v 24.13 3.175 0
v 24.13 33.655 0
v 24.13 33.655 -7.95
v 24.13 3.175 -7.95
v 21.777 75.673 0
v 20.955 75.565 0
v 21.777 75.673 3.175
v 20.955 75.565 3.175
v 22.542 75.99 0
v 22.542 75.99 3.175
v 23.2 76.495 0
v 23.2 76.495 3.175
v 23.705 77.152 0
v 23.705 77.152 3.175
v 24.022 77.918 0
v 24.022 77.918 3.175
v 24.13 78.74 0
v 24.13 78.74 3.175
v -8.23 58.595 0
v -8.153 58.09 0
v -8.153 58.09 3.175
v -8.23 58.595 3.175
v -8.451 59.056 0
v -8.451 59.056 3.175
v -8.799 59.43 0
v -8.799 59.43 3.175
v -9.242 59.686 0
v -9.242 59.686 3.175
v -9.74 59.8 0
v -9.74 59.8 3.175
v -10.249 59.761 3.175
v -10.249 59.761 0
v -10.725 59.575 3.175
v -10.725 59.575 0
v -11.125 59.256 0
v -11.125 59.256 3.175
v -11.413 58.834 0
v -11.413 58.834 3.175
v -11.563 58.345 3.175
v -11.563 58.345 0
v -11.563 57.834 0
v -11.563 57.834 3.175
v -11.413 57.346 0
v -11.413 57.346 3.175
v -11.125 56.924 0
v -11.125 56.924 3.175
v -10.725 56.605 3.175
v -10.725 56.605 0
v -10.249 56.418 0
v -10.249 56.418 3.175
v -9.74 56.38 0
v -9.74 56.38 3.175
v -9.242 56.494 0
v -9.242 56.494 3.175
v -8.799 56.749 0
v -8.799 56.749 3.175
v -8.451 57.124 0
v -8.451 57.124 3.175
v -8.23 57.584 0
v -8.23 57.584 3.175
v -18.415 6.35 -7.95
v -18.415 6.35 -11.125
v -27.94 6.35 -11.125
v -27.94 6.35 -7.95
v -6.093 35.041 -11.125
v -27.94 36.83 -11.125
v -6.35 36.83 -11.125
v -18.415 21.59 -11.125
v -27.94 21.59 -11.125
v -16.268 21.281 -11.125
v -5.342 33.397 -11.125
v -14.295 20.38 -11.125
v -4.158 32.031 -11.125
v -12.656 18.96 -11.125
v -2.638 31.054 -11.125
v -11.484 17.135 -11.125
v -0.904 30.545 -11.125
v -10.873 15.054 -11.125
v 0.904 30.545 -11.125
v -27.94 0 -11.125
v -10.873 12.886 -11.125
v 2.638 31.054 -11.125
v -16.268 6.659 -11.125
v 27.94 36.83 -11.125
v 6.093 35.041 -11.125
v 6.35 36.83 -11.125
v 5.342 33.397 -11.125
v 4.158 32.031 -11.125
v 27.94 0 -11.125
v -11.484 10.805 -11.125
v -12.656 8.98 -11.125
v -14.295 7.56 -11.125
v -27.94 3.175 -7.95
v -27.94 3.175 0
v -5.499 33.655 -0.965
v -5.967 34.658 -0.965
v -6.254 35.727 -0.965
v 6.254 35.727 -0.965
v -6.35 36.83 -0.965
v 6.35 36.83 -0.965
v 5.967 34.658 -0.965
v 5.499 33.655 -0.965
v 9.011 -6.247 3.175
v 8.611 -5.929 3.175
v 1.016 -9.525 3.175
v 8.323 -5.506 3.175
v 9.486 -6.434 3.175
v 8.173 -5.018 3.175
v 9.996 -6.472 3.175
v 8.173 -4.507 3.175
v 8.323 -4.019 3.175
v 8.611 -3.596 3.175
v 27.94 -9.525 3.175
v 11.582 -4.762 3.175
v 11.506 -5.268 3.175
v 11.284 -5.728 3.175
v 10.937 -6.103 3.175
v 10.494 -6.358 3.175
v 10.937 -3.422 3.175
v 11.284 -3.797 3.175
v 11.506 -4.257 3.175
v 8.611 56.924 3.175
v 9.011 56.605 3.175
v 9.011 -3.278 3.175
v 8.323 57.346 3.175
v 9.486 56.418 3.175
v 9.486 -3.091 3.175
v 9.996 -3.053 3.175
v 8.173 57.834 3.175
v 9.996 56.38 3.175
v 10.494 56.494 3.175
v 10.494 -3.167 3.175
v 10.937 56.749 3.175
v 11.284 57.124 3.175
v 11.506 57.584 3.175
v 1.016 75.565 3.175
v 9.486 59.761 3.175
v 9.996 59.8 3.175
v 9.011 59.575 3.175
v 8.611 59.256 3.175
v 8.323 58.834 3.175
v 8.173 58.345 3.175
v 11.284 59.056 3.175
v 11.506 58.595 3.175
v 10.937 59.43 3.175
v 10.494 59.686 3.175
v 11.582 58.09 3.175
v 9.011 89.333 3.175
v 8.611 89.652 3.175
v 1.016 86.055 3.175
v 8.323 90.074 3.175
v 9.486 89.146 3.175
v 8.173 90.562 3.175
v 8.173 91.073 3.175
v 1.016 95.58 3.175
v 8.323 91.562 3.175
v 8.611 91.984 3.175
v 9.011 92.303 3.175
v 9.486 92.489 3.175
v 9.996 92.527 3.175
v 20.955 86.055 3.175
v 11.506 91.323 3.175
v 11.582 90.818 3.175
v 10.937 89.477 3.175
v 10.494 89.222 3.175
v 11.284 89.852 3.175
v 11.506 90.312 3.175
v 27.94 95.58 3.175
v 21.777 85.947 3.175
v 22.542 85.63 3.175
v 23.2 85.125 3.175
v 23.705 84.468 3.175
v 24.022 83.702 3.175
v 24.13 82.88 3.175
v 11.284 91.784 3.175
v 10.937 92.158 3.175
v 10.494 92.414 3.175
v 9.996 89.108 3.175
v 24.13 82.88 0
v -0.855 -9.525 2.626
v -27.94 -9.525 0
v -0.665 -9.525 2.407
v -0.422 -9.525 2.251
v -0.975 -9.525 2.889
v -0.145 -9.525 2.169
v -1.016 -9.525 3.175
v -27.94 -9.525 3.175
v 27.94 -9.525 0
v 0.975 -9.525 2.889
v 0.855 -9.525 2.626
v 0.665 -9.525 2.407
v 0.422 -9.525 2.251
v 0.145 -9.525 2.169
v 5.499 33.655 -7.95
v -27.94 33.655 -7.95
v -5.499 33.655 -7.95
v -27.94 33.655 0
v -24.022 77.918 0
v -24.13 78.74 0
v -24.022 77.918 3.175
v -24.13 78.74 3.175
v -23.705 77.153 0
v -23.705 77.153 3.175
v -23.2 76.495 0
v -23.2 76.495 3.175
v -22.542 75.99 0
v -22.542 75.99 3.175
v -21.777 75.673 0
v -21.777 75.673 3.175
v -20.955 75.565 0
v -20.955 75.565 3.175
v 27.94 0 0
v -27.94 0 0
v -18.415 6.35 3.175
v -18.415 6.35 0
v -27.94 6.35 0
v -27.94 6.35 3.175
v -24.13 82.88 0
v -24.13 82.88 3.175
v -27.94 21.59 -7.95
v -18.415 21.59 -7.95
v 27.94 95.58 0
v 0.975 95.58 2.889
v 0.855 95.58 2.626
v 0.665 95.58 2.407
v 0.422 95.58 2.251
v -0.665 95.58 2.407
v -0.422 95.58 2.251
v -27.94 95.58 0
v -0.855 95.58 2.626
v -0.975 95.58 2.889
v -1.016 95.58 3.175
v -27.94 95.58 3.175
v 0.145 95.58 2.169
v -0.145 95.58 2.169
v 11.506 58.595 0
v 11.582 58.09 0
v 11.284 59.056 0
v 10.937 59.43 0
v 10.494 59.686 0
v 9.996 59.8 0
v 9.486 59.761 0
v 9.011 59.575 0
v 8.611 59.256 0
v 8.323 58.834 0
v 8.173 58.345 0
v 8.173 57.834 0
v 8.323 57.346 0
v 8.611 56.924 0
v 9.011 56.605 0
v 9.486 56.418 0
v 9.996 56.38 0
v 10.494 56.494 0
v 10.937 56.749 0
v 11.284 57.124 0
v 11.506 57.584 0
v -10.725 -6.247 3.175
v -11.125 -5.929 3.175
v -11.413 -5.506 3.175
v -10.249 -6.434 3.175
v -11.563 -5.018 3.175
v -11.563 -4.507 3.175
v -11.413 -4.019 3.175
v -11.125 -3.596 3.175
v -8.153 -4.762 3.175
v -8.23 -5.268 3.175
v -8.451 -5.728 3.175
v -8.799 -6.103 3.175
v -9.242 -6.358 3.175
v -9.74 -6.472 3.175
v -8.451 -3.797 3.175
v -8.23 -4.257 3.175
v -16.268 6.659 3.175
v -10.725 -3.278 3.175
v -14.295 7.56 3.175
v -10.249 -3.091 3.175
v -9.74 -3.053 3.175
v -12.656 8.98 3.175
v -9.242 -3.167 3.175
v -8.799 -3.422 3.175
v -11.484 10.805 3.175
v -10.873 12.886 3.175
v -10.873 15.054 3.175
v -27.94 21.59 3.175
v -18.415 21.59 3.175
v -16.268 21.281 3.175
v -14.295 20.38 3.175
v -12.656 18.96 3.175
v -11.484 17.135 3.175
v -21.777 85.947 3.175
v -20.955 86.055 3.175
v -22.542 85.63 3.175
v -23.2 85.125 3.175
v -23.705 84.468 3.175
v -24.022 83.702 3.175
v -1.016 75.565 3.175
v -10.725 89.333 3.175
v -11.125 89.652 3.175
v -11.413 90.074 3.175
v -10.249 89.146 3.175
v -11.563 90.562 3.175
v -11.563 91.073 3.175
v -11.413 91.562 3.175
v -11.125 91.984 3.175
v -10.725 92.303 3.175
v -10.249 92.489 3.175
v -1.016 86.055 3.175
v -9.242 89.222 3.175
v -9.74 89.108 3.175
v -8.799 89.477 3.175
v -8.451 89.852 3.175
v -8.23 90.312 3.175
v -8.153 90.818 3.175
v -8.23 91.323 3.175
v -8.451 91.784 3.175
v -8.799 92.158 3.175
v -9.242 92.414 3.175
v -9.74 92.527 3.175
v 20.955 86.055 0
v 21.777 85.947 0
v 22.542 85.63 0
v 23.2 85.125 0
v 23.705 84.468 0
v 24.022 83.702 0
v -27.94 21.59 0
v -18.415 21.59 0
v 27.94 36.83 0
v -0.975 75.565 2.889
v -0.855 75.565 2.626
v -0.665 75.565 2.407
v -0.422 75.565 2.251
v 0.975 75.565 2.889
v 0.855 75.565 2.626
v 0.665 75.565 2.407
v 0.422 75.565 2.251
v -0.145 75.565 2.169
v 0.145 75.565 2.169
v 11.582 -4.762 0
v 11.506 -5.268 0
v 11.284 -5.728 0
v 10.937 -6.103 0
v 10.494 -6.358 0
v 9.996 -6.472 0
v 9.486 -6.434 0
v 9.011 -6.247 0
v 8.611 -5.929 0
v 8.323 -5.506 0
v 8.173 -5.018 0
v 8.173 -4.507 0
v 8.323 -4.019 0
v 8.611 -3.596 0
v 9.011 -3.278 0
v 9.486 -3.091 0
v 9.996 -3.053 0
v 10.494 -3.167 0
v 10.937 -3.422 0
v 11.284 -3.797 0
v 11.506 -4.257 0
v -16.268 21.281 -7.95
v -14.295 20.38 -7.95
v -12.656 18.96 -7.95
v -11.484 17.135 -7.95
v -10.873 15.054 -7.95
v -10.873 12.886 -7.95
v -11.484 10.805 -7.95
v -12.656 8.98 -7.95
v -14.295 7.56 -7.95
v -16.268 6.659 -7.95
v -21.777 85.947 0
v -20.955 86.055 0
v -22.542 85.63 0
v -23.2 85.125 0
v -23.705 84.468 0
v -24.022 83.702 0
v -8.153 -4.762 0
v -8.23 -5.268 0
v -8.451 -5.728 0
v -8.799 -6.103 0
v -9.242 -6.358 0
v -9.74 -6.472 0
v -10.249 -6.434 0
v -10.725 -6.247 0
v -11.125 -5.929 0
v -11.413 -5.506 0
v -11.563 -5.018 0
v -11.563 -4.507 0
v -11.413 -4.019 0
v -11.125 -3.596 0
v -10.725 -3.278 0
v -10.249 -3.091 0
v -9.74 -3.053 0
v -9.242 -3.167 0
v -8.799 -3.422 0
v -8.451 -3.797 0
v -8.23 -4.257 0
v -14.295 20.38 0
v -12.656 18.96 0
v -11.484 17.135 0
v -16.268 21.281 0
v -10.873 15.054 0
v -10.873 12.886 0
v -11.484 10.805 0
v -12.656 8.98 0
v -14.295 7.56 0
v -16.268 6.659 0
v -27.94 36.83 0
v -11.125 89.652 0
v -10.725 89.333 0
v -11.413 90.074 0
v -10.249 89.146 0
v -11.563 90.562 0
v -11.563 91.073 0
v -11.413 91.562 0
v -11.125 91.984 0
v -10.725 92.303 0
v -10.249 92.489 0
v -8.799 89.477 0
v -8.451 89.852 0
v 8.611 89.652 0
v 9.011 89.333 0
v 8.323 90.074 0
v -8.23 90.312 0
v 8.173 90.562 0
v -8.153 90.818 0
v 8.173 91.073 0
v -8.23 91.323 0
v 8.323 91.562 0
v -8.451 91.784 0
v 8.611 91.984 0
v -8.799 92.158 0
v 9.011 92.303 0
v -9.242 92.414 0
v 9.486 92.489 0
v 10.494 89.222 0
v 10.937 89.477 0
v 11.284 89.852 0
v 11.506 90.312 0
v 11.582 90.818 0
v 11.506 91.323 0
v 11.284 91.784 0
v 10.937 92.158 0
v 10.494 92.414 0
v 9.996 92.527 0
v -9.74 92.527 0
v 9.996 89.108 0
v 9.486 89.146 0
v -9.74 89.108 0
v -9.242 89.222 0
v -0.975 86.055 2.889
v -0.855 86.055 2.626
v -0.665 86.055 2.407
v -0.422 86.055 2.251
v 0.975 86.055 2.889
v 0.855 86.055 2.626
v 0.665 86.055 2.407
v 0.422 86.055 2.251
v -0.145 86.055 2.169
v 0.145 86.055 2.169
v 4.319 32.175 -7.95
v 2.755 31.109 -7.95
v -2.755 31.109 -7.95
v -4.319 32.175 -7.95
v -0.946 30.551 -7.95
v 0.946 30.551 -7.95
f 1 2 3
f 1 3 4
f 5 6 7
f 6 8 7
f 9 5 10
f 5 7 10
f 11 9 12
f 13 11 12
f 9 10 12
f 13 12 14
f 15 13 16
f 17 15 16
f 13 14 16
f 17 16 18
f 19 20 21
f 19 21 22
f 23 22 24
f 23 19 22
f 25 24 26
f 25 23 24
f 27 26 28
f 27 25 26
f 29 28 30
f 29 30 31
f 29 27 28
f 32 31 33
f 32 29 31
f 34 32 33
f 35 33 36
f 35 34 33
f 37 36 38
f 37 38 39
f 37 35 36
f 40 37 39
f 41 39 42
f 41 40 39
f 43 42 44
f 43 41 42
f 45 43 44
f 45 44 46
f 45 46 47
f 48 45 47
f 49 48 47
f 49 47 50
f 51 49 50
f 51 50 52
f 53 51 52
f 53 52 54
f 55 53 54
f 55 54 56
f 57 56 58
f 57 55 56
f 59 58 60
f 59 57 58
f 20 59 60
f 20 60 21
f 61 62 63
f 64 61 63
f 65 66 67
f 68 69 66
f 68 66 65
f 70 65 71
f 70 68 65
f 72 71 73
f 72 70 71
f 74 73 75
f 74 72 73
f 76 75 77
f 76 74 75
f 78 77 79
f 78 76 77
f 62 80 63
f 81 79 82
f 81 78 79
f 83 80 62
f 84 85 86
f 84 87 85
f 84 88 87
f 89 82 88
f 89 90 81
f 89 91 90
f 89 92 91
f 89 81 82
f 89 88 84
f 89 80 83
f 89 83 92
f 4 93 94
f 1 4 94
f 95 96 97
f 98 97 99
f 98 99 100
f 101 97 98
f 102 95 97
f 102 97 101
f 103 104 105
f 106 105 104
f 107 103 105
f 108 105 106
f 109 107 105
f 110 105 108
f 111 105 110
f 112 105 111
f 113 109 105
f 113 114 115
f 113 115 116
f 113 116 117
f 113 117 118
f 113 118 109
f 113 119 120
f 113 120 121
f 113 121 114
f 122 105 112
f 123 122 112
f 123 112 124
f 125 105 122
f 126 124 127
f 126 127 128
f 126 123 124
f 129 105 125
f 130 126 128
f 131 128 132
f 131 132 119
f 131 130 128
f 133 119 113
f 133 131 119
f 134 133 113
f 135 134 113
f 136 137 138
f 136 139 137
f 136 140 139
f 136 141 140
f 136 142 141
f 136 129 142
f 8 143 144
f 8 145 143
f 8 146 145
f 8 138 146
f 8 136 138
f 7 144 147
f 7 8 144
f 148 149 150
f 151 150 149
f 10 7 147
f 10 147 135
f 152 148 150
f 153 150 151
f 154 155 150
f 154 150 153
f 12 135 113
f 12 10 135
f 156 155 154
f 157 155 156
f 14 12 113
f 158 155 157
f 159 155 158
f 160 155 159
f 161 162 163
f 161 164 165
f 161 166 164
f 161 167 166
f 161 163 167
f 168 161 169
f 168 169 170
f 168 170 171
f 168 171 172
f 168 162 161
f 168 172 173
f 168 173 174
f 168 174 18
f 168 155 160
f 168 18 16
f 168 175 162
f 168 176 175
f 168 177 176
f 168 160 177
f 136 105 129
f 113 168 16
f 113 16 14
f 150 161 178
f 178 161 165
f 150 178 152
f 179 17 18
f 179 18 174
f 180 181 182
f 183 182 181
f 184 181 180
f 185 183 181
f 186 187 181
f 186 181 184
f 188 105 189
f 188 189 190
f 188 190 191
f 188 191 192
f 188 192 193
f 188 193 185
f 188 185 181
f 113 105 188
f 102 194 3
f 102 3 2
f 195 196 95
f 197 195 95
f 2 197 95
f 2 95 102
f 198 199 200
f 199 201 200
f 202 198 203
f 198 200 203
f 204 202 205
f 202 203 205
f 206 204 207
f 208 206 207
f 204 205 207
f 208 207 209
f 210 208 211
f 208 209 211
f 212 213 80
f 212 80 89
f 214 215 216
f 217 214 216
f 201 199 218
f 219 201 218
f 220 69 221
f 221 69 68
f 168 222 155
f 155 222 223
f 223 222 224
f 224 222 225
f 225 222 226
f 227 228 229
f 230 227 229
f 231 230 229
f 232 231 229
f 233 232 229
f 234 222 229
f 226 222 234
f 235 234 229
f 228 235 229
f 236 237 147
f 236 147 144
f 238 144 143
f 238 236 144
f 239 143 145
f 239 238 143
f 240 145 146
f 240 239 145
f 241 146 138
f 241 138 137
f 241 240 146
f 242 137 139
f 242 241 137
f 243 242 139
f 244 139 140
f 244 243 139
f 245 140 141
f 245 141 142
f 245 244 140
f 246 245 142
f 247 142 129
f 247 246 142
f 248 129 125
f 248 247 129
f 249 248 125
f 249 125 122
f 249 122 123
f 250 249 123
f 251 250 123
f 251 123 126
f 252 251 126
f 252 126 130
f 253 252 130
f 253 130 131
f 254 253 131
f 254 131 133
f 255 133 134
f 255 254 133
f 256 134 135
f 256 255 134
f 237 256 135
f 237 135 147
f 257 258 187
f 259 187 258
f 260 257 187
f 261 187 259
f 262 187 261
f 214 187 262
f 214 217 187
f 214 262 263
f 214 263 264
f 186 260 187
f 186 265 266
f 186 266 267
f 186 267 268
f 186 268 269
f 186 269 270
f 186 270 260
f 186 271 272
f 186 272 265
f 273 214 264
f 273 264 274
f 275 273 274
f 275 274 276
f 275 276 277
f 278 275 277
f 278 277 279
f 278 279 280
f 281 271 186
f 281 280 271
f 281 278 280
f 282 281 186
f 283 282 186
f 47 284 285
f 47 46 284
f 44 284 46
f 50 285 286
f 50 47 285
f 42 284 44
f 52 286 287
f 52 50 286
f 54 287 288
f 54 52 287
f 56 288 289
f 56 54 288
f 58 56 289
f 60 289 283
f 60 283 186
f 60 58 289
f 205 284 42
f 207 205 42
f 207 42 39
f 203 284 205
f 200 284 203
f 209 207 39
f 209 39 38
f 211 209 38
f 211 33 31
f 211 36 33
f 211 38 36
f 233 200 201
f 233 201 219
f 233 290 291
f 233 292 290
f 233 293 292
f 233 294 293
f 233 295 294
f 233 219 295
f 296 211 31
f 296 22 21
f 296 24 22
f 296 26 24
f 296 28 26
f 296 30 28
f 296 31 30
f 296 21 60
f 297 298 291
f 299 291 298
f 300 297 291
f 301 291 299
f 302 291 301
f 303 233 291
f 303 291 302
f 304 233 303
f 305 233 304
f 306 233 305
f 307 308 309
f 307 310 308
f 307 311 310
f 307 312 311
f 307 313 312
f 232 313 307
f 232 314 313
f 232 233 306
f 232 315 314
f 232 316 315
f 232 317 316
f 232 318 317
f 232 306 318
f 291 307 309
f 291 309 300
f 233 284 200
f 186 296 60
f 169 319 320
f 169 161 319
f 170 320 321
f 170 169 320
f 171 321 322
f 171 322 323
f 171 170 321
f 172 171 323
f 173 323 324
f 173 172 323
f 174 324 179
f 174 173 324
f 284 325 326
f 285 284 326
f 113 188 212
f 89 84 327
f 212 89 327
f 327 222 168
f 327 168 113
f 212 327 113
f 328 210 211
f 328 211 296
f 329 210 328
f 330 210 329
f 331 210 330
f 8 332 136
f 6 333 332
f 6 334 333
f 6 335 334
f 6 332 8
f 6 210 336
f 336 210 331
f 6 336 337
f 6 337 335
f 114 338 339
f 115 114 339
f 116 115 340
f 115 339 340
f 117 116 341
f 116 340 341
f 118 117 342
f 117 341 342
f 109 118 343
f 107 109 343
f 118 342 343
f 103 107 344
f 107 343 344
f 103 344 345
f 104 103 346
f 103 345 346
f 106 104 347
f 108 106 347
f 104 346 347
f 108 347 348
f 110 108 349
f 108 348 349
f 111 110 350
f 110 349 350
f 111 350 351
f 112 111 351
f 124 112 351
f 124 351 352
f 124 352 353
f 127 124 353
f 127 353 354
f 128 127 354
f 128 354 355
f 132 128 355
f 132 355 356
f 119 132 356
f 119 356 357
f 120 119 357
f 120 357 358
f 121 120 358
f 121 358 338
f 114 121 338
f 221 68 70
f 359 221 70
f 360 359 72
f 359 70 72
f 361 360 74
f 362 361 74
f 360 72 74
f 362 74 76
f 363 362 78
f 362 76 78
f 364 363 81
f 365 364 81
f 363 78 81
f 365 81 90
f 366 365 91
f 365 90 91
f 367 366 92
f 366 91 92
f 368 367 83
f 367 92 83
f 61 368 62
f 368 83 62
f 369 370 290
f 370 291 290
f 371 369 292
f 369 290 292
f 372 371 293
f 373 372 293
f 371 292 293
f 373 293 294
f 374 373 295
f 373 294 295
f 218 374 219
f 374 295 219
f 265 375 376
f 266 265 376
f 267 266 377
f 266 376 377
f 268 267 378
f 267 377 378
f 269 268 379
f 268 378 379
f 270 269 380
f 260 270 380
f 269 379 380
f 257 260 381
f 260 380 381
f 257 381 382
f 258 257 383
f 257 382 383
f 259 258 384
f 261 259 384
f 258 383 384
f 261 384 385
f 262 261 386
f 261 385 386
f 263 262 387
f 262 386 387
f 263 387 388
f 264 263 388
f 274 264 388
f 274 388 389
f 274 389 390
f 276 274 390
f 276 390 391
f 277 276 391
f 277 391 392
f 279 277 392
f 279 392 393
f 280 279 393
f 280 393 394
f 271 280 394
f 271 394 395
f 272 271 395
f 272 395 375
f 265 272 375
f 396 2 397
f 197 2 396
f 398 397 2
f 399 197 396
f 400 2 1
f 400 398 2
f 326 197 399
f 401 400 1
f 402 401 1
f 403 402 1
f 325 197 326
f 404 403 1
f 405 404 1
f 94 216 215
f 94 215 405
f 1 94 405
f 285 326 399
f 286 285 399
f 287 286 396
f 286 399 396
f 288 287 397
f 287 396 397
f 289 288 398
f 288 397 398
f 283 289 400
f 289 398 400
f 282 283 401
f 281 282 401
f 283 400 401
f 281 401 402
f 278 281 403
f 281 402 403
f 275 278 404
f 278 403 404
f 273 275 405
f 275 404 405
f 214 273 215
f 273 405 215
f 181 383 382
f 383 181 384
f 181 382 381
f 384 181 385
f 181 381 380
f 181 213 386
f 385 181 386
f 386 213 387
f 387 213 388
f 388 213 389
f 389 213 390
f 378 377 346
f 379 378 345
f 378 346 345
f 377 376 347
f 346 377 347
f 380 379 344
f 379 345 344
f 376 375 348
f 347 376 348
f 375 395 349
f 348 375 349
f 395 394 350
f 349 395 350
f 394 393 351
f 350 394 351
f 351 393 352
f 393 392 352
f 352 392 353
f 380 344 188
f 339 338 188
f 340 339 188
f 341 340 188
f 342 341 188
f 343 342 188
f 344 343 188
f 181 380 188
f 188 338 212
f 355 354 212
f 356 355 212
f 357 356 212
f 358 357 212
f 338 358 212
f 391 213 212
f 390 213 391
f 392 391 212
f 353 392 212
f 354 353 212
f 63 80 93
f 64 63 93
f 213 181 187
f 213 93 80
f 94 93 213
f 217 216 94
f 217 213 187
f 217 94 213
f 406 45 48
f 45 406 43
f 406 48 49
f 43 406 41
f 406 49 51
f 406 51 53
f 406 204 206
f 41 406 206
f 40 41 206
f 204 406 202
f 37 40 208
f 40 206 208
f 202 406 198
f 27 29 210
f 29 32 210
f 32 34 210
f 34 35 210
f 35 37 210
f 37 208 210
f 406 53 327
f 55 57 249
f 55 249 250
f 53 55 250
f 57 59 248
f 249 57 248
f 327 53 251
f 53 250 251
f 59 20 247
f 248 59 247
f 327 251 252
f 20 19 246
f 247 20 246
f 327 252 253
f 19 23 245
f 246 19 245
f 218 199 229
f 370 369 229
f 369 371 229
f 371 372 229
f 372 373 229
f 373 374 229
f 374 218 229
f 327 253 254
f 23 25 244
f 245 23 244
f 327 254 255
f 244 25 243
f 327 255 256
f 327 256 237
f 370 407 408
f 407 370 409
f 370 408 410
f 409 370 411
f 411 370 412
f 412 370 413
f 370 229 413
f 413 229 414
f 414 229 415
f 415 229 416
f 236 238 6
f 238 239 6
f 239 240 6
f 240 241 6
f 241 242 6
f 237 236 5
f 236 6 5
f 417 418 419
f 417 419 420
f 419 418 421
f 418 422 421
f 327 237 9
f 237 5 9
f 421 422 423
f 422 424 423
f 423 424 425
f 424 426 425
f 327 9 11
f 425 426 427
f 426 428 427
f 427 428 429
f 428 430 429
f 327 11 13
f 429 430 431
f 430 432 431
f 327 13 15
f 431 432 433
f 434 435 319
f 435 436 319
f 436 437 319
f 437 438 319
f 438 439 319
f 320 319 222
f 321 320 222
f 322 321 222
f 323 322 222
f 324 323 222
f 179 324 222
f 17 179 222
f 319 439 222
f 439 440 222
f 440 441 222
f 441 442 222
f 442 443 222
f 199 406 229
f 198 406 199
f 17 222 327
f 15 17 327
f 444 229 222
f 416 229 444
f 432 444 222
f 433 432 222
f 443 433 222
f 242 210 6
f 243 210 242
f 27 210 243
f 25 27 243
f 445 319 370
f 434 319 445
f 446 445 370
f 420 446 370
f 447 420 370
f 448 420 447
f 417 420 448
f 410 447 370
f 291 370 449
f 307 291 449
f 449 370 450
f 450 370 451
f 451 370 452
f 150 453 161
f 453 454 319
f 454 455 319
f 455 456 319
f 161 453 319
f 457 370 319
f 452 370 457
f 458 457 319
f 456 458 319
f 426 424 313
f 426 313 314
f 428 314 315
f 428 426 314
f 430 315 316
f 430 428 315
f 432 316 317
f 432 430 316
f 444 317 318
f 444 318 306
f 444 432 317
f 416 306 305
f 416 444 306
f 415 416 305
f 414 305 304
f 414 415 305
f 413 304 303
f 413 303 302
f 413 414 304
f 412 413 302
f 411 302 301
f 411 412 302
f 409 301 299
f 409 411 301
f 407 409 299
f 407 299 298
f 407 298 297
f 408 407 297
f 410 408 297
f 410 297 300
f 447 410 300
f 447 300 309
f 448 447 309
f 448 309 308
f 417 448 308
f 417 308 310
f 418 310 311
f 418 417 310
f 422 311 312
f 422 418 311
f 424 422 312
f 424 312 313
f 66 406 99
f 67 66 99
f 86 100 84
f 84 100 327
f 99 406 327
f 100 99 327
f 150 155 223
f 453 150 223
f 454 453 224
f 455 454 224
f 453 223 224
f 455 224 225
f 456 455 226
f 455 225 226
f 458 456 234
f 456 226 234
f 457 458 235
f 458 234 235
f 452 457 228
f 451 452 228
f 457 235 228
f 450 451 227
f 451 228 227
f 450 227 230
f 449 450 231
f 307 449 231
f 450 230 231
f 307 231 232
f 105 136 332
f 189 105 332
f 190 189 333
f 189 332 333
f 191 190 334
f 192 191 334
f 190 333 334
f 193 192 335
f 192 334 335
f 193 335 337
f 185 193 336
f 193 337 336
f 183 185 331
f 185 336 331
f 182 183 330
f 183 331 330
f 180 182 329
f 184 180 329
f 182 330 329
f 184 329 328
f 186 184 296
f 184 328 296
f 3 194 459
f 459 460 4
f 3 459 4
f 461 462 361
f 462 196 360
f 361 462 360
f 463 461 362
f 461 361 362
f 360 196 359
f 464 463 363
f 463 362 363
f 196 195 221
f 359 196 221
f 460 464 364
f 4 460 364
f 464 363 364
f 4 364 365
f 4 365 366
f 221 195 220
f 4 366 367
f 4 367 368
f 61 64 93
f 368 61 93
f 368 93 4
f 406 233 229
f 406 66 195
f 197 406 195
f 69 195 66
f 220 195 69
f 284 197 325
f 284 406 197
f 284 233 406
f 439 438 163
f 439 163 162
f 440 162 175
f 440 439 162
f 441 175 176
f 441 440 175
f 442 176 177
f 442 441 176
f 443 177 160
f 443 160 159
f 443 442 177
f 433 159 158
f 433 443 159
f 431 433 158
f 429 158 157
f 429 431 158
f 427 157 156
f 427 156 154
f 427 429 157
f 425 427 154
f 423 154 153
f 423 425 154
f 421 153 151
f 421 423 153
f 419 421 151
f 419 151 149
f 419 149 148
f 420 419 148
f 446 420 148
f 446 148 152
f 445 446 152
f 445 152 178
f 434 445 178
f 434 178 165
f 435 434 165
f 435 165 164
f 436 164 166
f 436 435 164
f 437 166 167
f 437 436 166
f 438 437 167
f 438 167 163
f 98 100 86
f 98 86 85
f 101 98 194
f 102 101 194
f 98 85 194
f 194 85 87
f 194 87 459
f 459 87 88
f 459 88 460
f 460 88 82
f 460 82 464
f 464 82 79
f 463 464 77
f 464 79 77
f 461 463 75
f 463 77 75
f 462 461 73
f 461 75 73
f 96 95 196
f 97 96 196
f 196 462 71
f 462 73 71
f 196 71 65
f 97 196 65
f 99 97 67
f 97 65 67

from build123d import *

# Parameters (mm, degrees)
F0_R      = 1.7145
F0_W      = 48.26
F0_H      = 10.4902
F1_DEPTH  = 3.175
F2_W      = 55.88
F2_H      = 36.83
F3_DEPTH  = 11.1252
F5_DEPTH  = 14.3012
F6_W      = 55.88
F6_H      = 3.175
F7_DEPTH  = 9.525
F8_R      = 1.016
F9_DEPTH  = 105.1062
F10_W     = 30.48
F10_H     = 7.9502
F11_DEPTH = 52.07
F12_R     = 3.175
F13_R     = 1.7145
F14_DEPTH = 25.4
F16_DEPTH = 10.16


with BuildPart() as f1:
    # F0 (on Top) → F1 (new body)
    with BuildSketch(Plane.XY):
        Polygon((-27.94, 0), (27.94, 0), (27.94, 72.39), (27.94, 95.5802), (-27.94, 95.5802), (-27.94, 72.39), align=None)
        with Locations((-9.8679, 58.0898)):
            Circle(F0_R, mode=Mode.SUBTRACT)
        with Locations((0, 80.8101)):
            Rectangle(F0_W, F0_H, mode=Mode.SUBTRACT)
        with Locations((-9.8679, 90.8177)):
            Circle(F0_R, mode=Mode.SUBTRACT)
        with Locations((9.8679, 58.0898)):
            Circle(F0_R, mode=Mode.SUBTRACT)
        with Locations((9.8679, 90.8177)):
            Circle(F0_R, mode=Mode.SUBTRACT)
    extrude(amount=F1_DEPTH)

    # F2 (on face) → F3 (join)
    with BuildSketch(Plane(origin=(0, 0, 0), x_dir=(1, 0, 0), z_dir=(0, 0, -1))):
        with Locations((0, -18.415)):
            Rectangle(F2_W, F2_H)
    extrude(amount=F3_DEPTH)

    # F4 (on face) → F5 (cut, through all)
    with BuildSketch(Plane(origin=(0, 0, -11.1252), x_dir=(1, 0, 0), z_dir=(0, 0, -1))):
        with BuildLine():
            Line((-27.94, -6.35), (-27.94, -21.59))
            Line((-27.94, -21.59), (-18.415, -21.59))
            ThreePointArc((-18.415, -21.59), (-10.795, -13.97), (-18.415, -6.35))
            Line((-18.415, -6.35), (-27.94, -6.35))
        make_face()
    extrude(amount=-F5_DEPTH, mode=Mode.SUBTRACT)

    # F6 (on face) → F7 (join)
    with BuildSketch(Plane.XZ):
        with Locations((0, 1.5875)):
            Rectangle(F6_W, F6_H)
    extrude(amount=F7_DEPTH)

    # F8 (on face) → F9 (cut, through all)
    with BuildSketch(Plane(origin=(0, 95.5802, 0), x_dir=(-1, 0, 0), z_dir=(0, 1, 0))):
        with Locations((0, 3.175)):
            Circle(F8_R)
    extrude(amount=-F9_DEPTH, mode=Mode.SUBTRACT)

    # F10 (on face) → F11 (cut)
    with BuildSketch(Plane(origin=(-27.94, 0, 0), x_dir=(0, -1, 0), z_dir=(-1, 0, 0))):
        with Locations((-18.415, -3.9751)):
            Rectangle(F10_W, F10_H)
    extrude(amount=-F11_DEPTH, mode=Mode.SUBTRACT)

    # F12
    f12_edges = [f1.edges().sort_by_distance(p)[0] for p in [
        (24.13, 75.565, 1.5875),
        (-24.13, 75.565, 1.5875),
        (-24.13, 86.0552, 1.5875),
        (24.13, 86.0552, 1.5875),
    ]]
    fillet(f12_edges, radius=F12_R)

    # F13 (on face) → F14 (cut)
    with BuildSketch(Plane(origin=(0, 0, 0), x_dir=(1, 0, 0), z_dir=(0, 0, -1))):
        with Locations((-9.8679, 4.7625)):
            Circle(F13_R)
        with Locations((9.8679, 4.7625)):
            Circle(F13_R)
    extrude(amount=-F14_DEPTH, mode=Mode.SUBTRACT)

    # F15 (on face) → F16 (cut)
    with BuildSketch(Plane(origin=(0, 0, -11.1252), x_dir=(1, 0, 0), z_dir=(0, 0, -1))):
        with BuildLine():
            Line((-6.35, -36.83), (6.35, -36.83))
            ThreePointArc((6.35, -36.83), (0, -30.48), (-6.35, -36.83))
        make_face()
    extrude(amount=-F16_DEPTH, mode=Mode.SUBTRACT)


solid = f1.part
